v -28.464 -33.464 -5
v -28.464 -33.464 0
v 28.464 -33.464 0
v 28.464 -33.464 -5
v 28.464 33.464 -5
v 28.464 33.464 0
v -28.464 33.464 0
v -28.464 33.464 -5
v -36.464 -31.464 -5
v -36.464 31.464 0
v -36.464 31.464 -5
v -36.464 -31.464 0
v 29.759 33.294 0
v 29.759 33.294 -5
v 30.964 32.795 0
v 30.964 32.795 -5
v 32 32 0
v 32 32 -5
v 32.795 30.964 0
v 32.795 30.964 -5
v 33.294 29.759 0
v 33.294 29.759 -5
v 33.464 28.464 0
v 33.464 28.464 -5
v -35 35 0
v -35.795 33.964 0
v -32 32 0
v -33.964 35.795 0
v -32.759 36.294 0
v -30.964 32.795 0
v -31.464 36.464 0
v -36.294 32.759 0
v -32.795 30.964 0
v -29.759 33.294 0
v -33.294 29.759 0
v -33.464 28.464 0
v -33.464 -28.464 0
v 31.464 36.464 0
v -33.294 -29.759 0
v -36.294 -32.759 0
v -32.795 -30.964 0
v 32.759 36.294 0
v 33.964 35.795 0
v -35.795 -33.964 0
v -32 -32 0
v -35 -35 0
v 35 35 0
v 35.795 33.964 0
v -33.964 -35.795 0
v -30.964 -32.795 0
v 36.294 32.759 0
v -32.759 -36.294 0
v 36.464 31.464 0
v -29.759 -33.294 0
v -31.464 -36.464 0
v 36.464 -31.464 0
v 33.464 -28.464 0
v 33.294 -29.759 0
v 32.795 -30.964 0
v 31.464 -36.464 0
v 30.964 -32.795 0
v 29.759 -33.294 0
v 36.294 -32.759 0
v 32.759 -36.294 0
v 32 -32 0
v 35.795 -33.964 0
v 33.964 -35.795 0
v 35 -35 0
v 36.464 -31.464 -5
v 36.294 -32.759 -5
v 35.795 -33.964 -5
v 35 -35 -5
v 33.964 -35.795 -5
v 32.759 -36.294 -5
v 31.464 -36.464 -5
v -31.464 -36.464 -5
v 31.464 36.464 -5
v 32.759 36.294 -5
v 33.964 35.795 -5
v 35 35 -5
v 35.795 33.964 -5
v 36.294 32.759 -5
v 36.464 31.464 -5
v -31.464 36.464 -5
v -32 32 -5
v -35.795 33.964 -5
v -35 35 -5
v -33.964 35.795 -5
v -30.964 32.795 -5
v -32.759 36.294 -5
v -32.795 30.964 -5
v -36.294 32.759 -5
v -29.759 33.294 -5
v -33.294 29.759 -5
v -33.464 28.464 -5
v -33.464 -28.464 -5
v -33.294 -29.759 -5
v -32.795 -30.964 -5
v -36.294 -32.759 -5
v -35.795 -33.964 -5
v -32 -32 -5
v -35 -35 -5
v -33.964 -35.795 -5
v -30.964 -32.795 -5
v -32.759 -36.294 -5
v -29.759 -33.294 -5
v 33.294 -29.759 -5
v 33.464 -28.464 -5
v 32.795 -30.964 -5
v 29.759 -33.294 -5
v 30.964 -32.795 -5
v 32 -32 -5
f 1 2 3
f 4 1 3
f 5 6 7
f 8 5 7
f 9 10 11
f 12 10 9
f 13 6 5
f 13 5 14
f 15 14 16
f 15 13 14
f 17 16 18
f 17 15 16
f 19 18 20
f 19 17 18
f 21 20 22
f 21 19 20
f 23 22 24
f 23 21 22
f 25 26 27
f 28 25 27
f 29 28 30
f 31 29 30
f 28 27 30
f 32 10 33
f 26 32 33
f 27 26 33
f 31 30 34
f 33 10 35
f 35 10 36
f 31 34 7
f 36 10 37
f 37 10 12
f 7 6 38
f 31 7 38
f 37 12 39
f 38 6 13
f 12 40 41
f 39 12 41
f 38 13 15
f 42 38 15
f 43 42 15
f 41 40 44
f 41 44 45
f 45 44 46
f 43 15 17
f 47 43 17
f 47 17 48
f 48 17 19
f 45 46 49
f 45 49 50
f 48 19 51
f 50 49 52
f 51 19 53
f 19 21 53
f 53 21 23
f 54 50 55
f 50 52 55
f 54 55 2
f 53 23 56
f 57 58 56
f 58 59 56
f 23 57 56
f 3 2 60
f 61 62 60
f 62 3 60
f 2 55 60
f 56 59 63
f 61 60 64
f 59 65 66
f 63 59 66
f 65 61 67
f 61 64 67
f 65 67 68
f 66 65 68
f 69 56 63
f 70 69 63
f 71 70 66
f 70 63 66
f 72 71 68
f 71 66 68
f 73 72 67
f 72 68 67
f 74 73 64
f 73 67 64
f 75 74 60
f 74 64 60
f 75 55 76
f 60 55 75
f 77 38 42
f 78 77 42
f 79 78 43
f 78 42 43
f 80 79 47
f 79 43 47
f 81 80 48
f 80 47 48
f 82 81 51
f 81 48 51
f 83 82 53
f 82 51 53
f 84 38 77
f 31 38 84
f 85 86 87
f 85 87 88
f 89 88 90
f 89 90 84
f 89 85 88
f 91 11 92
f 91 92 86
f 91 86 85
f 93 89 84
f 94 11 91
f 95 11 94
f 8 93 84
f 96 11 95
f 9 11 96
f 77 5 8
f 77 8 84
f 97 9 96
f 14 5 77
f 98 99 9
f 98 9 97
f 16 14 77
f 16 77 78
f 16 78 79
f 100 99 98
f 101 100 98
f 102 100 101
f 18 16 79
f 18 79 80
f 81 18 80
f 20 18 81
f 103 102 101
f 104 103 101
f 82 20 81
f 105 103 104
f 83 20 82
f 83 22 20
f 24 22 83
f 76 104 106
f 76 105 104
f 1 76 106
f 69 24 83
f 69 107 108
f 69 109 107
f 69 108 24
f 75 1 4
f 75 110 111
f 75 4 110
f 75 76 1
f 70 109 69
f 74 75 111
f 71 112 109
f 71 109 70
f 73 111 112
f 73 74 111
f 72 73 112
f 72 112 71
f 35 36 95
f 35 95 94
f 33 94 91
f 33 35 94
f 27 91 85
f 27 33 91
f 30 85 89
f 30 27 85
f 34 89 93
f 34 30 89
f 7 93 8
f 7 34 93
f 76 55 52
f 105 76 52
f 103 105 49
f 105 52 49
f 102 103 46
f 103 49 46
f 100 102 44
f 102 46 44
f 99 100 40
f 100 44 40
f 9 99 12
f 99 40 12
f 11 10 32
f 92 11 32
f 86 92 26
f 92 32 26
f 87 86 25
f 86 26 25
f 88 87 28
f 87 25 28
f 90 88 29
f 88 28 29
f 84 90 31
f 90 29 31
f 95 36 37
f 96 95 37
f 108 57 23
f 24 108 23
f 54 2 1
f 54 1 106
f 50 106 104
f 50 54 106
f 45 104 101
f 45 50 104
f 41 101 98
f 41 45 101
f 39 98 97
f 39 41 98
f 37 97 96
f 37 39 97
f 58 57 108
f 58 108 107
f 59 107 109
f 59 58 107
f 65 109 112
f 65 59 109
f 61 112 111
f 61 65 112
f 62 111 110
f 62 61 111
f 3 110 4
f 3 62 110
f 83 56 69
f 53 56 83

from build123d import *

# Parameters (mm, degrees)
EXTRUDE003_DEPTH = 5
EXTRUDE002_DEPTH = 5


with BuildPart() as extrude003:
    # Sketch010 (on Face2 of Cut) → Extrude003 (new body)
    with BuildSketch(Plane(origin=(0, 0, 0), x_dir=(1, 0, 0), z_dir=(0, 0, -1))):
        with BuildLine():
            Line((-28.464466, 33.464466), (28.464466, 33.464466))
            ThreePointArc((33.464466, 28.464466), (32, 32), (28.464466, 33.464466))
            Line((33.464466, 28.464466), (33.464466, -28.464466))
            ThreePointArc((28.464466, -33.464466), (32, -32), (33.464466, -28.464466))
            Line((28.464466, -33.464466), (-28.464466, -33.464466))
            ThreePointArc((-33.464466, -28.464466), (-32, -32), (-28.464466, -33.464466))
            Line((-33.464466, -28.464466), (-33.464466, 28.464466))
            ThreePointArc((-28.464466, 33.464466), (-32, 32), (-33.464466, 28.464466))
        make_face()
    extrude(amount=EXTRUDE003_DEPTH)


with BuildPart() as cut_insertintotophalf:
    # Sketch009 (on Face2 of Cut) → Extrude002 (new body)
    with BuildSketch(Plane(origin=(0, 0, 0), x_dir=(1, 0, 0), z_dir=(0, 0, -1))):
        with BuildLine():
            ThreePointArc((-31.464466, 36.464466), (-35, 35), (-36.464466, 31.464466))
            Line((-36.464466, -31.464466), (-36.464466, 31.464466))
            ThreePointArc((-36.464466, -31.464466), (-35, -35), (-31.464466, -36.464466))
            Line((31.464466, -36.464466), (-31.464466, -36.464466))
            ThreePointArc((31.464466, -36.464466), (35, -35), (36.464466, -31.464466))
            Line((36.464466, 31.464466), (36.464466, -31.464466))
            ThreePointArc((36.464466, 31.464466), (35, 35), (31.464466, 36.464466))
            Line((-31.464466, 36.464466), (31.464466, 36.464466))
        make_face()
    extrude(amount=EXTRUDE002_DEPTH)

    # Cut001: cut Extrude003
    add(extrude003.part, mode=Mode.SUBTRACT)


solid = cut_insertintotophalf.part
